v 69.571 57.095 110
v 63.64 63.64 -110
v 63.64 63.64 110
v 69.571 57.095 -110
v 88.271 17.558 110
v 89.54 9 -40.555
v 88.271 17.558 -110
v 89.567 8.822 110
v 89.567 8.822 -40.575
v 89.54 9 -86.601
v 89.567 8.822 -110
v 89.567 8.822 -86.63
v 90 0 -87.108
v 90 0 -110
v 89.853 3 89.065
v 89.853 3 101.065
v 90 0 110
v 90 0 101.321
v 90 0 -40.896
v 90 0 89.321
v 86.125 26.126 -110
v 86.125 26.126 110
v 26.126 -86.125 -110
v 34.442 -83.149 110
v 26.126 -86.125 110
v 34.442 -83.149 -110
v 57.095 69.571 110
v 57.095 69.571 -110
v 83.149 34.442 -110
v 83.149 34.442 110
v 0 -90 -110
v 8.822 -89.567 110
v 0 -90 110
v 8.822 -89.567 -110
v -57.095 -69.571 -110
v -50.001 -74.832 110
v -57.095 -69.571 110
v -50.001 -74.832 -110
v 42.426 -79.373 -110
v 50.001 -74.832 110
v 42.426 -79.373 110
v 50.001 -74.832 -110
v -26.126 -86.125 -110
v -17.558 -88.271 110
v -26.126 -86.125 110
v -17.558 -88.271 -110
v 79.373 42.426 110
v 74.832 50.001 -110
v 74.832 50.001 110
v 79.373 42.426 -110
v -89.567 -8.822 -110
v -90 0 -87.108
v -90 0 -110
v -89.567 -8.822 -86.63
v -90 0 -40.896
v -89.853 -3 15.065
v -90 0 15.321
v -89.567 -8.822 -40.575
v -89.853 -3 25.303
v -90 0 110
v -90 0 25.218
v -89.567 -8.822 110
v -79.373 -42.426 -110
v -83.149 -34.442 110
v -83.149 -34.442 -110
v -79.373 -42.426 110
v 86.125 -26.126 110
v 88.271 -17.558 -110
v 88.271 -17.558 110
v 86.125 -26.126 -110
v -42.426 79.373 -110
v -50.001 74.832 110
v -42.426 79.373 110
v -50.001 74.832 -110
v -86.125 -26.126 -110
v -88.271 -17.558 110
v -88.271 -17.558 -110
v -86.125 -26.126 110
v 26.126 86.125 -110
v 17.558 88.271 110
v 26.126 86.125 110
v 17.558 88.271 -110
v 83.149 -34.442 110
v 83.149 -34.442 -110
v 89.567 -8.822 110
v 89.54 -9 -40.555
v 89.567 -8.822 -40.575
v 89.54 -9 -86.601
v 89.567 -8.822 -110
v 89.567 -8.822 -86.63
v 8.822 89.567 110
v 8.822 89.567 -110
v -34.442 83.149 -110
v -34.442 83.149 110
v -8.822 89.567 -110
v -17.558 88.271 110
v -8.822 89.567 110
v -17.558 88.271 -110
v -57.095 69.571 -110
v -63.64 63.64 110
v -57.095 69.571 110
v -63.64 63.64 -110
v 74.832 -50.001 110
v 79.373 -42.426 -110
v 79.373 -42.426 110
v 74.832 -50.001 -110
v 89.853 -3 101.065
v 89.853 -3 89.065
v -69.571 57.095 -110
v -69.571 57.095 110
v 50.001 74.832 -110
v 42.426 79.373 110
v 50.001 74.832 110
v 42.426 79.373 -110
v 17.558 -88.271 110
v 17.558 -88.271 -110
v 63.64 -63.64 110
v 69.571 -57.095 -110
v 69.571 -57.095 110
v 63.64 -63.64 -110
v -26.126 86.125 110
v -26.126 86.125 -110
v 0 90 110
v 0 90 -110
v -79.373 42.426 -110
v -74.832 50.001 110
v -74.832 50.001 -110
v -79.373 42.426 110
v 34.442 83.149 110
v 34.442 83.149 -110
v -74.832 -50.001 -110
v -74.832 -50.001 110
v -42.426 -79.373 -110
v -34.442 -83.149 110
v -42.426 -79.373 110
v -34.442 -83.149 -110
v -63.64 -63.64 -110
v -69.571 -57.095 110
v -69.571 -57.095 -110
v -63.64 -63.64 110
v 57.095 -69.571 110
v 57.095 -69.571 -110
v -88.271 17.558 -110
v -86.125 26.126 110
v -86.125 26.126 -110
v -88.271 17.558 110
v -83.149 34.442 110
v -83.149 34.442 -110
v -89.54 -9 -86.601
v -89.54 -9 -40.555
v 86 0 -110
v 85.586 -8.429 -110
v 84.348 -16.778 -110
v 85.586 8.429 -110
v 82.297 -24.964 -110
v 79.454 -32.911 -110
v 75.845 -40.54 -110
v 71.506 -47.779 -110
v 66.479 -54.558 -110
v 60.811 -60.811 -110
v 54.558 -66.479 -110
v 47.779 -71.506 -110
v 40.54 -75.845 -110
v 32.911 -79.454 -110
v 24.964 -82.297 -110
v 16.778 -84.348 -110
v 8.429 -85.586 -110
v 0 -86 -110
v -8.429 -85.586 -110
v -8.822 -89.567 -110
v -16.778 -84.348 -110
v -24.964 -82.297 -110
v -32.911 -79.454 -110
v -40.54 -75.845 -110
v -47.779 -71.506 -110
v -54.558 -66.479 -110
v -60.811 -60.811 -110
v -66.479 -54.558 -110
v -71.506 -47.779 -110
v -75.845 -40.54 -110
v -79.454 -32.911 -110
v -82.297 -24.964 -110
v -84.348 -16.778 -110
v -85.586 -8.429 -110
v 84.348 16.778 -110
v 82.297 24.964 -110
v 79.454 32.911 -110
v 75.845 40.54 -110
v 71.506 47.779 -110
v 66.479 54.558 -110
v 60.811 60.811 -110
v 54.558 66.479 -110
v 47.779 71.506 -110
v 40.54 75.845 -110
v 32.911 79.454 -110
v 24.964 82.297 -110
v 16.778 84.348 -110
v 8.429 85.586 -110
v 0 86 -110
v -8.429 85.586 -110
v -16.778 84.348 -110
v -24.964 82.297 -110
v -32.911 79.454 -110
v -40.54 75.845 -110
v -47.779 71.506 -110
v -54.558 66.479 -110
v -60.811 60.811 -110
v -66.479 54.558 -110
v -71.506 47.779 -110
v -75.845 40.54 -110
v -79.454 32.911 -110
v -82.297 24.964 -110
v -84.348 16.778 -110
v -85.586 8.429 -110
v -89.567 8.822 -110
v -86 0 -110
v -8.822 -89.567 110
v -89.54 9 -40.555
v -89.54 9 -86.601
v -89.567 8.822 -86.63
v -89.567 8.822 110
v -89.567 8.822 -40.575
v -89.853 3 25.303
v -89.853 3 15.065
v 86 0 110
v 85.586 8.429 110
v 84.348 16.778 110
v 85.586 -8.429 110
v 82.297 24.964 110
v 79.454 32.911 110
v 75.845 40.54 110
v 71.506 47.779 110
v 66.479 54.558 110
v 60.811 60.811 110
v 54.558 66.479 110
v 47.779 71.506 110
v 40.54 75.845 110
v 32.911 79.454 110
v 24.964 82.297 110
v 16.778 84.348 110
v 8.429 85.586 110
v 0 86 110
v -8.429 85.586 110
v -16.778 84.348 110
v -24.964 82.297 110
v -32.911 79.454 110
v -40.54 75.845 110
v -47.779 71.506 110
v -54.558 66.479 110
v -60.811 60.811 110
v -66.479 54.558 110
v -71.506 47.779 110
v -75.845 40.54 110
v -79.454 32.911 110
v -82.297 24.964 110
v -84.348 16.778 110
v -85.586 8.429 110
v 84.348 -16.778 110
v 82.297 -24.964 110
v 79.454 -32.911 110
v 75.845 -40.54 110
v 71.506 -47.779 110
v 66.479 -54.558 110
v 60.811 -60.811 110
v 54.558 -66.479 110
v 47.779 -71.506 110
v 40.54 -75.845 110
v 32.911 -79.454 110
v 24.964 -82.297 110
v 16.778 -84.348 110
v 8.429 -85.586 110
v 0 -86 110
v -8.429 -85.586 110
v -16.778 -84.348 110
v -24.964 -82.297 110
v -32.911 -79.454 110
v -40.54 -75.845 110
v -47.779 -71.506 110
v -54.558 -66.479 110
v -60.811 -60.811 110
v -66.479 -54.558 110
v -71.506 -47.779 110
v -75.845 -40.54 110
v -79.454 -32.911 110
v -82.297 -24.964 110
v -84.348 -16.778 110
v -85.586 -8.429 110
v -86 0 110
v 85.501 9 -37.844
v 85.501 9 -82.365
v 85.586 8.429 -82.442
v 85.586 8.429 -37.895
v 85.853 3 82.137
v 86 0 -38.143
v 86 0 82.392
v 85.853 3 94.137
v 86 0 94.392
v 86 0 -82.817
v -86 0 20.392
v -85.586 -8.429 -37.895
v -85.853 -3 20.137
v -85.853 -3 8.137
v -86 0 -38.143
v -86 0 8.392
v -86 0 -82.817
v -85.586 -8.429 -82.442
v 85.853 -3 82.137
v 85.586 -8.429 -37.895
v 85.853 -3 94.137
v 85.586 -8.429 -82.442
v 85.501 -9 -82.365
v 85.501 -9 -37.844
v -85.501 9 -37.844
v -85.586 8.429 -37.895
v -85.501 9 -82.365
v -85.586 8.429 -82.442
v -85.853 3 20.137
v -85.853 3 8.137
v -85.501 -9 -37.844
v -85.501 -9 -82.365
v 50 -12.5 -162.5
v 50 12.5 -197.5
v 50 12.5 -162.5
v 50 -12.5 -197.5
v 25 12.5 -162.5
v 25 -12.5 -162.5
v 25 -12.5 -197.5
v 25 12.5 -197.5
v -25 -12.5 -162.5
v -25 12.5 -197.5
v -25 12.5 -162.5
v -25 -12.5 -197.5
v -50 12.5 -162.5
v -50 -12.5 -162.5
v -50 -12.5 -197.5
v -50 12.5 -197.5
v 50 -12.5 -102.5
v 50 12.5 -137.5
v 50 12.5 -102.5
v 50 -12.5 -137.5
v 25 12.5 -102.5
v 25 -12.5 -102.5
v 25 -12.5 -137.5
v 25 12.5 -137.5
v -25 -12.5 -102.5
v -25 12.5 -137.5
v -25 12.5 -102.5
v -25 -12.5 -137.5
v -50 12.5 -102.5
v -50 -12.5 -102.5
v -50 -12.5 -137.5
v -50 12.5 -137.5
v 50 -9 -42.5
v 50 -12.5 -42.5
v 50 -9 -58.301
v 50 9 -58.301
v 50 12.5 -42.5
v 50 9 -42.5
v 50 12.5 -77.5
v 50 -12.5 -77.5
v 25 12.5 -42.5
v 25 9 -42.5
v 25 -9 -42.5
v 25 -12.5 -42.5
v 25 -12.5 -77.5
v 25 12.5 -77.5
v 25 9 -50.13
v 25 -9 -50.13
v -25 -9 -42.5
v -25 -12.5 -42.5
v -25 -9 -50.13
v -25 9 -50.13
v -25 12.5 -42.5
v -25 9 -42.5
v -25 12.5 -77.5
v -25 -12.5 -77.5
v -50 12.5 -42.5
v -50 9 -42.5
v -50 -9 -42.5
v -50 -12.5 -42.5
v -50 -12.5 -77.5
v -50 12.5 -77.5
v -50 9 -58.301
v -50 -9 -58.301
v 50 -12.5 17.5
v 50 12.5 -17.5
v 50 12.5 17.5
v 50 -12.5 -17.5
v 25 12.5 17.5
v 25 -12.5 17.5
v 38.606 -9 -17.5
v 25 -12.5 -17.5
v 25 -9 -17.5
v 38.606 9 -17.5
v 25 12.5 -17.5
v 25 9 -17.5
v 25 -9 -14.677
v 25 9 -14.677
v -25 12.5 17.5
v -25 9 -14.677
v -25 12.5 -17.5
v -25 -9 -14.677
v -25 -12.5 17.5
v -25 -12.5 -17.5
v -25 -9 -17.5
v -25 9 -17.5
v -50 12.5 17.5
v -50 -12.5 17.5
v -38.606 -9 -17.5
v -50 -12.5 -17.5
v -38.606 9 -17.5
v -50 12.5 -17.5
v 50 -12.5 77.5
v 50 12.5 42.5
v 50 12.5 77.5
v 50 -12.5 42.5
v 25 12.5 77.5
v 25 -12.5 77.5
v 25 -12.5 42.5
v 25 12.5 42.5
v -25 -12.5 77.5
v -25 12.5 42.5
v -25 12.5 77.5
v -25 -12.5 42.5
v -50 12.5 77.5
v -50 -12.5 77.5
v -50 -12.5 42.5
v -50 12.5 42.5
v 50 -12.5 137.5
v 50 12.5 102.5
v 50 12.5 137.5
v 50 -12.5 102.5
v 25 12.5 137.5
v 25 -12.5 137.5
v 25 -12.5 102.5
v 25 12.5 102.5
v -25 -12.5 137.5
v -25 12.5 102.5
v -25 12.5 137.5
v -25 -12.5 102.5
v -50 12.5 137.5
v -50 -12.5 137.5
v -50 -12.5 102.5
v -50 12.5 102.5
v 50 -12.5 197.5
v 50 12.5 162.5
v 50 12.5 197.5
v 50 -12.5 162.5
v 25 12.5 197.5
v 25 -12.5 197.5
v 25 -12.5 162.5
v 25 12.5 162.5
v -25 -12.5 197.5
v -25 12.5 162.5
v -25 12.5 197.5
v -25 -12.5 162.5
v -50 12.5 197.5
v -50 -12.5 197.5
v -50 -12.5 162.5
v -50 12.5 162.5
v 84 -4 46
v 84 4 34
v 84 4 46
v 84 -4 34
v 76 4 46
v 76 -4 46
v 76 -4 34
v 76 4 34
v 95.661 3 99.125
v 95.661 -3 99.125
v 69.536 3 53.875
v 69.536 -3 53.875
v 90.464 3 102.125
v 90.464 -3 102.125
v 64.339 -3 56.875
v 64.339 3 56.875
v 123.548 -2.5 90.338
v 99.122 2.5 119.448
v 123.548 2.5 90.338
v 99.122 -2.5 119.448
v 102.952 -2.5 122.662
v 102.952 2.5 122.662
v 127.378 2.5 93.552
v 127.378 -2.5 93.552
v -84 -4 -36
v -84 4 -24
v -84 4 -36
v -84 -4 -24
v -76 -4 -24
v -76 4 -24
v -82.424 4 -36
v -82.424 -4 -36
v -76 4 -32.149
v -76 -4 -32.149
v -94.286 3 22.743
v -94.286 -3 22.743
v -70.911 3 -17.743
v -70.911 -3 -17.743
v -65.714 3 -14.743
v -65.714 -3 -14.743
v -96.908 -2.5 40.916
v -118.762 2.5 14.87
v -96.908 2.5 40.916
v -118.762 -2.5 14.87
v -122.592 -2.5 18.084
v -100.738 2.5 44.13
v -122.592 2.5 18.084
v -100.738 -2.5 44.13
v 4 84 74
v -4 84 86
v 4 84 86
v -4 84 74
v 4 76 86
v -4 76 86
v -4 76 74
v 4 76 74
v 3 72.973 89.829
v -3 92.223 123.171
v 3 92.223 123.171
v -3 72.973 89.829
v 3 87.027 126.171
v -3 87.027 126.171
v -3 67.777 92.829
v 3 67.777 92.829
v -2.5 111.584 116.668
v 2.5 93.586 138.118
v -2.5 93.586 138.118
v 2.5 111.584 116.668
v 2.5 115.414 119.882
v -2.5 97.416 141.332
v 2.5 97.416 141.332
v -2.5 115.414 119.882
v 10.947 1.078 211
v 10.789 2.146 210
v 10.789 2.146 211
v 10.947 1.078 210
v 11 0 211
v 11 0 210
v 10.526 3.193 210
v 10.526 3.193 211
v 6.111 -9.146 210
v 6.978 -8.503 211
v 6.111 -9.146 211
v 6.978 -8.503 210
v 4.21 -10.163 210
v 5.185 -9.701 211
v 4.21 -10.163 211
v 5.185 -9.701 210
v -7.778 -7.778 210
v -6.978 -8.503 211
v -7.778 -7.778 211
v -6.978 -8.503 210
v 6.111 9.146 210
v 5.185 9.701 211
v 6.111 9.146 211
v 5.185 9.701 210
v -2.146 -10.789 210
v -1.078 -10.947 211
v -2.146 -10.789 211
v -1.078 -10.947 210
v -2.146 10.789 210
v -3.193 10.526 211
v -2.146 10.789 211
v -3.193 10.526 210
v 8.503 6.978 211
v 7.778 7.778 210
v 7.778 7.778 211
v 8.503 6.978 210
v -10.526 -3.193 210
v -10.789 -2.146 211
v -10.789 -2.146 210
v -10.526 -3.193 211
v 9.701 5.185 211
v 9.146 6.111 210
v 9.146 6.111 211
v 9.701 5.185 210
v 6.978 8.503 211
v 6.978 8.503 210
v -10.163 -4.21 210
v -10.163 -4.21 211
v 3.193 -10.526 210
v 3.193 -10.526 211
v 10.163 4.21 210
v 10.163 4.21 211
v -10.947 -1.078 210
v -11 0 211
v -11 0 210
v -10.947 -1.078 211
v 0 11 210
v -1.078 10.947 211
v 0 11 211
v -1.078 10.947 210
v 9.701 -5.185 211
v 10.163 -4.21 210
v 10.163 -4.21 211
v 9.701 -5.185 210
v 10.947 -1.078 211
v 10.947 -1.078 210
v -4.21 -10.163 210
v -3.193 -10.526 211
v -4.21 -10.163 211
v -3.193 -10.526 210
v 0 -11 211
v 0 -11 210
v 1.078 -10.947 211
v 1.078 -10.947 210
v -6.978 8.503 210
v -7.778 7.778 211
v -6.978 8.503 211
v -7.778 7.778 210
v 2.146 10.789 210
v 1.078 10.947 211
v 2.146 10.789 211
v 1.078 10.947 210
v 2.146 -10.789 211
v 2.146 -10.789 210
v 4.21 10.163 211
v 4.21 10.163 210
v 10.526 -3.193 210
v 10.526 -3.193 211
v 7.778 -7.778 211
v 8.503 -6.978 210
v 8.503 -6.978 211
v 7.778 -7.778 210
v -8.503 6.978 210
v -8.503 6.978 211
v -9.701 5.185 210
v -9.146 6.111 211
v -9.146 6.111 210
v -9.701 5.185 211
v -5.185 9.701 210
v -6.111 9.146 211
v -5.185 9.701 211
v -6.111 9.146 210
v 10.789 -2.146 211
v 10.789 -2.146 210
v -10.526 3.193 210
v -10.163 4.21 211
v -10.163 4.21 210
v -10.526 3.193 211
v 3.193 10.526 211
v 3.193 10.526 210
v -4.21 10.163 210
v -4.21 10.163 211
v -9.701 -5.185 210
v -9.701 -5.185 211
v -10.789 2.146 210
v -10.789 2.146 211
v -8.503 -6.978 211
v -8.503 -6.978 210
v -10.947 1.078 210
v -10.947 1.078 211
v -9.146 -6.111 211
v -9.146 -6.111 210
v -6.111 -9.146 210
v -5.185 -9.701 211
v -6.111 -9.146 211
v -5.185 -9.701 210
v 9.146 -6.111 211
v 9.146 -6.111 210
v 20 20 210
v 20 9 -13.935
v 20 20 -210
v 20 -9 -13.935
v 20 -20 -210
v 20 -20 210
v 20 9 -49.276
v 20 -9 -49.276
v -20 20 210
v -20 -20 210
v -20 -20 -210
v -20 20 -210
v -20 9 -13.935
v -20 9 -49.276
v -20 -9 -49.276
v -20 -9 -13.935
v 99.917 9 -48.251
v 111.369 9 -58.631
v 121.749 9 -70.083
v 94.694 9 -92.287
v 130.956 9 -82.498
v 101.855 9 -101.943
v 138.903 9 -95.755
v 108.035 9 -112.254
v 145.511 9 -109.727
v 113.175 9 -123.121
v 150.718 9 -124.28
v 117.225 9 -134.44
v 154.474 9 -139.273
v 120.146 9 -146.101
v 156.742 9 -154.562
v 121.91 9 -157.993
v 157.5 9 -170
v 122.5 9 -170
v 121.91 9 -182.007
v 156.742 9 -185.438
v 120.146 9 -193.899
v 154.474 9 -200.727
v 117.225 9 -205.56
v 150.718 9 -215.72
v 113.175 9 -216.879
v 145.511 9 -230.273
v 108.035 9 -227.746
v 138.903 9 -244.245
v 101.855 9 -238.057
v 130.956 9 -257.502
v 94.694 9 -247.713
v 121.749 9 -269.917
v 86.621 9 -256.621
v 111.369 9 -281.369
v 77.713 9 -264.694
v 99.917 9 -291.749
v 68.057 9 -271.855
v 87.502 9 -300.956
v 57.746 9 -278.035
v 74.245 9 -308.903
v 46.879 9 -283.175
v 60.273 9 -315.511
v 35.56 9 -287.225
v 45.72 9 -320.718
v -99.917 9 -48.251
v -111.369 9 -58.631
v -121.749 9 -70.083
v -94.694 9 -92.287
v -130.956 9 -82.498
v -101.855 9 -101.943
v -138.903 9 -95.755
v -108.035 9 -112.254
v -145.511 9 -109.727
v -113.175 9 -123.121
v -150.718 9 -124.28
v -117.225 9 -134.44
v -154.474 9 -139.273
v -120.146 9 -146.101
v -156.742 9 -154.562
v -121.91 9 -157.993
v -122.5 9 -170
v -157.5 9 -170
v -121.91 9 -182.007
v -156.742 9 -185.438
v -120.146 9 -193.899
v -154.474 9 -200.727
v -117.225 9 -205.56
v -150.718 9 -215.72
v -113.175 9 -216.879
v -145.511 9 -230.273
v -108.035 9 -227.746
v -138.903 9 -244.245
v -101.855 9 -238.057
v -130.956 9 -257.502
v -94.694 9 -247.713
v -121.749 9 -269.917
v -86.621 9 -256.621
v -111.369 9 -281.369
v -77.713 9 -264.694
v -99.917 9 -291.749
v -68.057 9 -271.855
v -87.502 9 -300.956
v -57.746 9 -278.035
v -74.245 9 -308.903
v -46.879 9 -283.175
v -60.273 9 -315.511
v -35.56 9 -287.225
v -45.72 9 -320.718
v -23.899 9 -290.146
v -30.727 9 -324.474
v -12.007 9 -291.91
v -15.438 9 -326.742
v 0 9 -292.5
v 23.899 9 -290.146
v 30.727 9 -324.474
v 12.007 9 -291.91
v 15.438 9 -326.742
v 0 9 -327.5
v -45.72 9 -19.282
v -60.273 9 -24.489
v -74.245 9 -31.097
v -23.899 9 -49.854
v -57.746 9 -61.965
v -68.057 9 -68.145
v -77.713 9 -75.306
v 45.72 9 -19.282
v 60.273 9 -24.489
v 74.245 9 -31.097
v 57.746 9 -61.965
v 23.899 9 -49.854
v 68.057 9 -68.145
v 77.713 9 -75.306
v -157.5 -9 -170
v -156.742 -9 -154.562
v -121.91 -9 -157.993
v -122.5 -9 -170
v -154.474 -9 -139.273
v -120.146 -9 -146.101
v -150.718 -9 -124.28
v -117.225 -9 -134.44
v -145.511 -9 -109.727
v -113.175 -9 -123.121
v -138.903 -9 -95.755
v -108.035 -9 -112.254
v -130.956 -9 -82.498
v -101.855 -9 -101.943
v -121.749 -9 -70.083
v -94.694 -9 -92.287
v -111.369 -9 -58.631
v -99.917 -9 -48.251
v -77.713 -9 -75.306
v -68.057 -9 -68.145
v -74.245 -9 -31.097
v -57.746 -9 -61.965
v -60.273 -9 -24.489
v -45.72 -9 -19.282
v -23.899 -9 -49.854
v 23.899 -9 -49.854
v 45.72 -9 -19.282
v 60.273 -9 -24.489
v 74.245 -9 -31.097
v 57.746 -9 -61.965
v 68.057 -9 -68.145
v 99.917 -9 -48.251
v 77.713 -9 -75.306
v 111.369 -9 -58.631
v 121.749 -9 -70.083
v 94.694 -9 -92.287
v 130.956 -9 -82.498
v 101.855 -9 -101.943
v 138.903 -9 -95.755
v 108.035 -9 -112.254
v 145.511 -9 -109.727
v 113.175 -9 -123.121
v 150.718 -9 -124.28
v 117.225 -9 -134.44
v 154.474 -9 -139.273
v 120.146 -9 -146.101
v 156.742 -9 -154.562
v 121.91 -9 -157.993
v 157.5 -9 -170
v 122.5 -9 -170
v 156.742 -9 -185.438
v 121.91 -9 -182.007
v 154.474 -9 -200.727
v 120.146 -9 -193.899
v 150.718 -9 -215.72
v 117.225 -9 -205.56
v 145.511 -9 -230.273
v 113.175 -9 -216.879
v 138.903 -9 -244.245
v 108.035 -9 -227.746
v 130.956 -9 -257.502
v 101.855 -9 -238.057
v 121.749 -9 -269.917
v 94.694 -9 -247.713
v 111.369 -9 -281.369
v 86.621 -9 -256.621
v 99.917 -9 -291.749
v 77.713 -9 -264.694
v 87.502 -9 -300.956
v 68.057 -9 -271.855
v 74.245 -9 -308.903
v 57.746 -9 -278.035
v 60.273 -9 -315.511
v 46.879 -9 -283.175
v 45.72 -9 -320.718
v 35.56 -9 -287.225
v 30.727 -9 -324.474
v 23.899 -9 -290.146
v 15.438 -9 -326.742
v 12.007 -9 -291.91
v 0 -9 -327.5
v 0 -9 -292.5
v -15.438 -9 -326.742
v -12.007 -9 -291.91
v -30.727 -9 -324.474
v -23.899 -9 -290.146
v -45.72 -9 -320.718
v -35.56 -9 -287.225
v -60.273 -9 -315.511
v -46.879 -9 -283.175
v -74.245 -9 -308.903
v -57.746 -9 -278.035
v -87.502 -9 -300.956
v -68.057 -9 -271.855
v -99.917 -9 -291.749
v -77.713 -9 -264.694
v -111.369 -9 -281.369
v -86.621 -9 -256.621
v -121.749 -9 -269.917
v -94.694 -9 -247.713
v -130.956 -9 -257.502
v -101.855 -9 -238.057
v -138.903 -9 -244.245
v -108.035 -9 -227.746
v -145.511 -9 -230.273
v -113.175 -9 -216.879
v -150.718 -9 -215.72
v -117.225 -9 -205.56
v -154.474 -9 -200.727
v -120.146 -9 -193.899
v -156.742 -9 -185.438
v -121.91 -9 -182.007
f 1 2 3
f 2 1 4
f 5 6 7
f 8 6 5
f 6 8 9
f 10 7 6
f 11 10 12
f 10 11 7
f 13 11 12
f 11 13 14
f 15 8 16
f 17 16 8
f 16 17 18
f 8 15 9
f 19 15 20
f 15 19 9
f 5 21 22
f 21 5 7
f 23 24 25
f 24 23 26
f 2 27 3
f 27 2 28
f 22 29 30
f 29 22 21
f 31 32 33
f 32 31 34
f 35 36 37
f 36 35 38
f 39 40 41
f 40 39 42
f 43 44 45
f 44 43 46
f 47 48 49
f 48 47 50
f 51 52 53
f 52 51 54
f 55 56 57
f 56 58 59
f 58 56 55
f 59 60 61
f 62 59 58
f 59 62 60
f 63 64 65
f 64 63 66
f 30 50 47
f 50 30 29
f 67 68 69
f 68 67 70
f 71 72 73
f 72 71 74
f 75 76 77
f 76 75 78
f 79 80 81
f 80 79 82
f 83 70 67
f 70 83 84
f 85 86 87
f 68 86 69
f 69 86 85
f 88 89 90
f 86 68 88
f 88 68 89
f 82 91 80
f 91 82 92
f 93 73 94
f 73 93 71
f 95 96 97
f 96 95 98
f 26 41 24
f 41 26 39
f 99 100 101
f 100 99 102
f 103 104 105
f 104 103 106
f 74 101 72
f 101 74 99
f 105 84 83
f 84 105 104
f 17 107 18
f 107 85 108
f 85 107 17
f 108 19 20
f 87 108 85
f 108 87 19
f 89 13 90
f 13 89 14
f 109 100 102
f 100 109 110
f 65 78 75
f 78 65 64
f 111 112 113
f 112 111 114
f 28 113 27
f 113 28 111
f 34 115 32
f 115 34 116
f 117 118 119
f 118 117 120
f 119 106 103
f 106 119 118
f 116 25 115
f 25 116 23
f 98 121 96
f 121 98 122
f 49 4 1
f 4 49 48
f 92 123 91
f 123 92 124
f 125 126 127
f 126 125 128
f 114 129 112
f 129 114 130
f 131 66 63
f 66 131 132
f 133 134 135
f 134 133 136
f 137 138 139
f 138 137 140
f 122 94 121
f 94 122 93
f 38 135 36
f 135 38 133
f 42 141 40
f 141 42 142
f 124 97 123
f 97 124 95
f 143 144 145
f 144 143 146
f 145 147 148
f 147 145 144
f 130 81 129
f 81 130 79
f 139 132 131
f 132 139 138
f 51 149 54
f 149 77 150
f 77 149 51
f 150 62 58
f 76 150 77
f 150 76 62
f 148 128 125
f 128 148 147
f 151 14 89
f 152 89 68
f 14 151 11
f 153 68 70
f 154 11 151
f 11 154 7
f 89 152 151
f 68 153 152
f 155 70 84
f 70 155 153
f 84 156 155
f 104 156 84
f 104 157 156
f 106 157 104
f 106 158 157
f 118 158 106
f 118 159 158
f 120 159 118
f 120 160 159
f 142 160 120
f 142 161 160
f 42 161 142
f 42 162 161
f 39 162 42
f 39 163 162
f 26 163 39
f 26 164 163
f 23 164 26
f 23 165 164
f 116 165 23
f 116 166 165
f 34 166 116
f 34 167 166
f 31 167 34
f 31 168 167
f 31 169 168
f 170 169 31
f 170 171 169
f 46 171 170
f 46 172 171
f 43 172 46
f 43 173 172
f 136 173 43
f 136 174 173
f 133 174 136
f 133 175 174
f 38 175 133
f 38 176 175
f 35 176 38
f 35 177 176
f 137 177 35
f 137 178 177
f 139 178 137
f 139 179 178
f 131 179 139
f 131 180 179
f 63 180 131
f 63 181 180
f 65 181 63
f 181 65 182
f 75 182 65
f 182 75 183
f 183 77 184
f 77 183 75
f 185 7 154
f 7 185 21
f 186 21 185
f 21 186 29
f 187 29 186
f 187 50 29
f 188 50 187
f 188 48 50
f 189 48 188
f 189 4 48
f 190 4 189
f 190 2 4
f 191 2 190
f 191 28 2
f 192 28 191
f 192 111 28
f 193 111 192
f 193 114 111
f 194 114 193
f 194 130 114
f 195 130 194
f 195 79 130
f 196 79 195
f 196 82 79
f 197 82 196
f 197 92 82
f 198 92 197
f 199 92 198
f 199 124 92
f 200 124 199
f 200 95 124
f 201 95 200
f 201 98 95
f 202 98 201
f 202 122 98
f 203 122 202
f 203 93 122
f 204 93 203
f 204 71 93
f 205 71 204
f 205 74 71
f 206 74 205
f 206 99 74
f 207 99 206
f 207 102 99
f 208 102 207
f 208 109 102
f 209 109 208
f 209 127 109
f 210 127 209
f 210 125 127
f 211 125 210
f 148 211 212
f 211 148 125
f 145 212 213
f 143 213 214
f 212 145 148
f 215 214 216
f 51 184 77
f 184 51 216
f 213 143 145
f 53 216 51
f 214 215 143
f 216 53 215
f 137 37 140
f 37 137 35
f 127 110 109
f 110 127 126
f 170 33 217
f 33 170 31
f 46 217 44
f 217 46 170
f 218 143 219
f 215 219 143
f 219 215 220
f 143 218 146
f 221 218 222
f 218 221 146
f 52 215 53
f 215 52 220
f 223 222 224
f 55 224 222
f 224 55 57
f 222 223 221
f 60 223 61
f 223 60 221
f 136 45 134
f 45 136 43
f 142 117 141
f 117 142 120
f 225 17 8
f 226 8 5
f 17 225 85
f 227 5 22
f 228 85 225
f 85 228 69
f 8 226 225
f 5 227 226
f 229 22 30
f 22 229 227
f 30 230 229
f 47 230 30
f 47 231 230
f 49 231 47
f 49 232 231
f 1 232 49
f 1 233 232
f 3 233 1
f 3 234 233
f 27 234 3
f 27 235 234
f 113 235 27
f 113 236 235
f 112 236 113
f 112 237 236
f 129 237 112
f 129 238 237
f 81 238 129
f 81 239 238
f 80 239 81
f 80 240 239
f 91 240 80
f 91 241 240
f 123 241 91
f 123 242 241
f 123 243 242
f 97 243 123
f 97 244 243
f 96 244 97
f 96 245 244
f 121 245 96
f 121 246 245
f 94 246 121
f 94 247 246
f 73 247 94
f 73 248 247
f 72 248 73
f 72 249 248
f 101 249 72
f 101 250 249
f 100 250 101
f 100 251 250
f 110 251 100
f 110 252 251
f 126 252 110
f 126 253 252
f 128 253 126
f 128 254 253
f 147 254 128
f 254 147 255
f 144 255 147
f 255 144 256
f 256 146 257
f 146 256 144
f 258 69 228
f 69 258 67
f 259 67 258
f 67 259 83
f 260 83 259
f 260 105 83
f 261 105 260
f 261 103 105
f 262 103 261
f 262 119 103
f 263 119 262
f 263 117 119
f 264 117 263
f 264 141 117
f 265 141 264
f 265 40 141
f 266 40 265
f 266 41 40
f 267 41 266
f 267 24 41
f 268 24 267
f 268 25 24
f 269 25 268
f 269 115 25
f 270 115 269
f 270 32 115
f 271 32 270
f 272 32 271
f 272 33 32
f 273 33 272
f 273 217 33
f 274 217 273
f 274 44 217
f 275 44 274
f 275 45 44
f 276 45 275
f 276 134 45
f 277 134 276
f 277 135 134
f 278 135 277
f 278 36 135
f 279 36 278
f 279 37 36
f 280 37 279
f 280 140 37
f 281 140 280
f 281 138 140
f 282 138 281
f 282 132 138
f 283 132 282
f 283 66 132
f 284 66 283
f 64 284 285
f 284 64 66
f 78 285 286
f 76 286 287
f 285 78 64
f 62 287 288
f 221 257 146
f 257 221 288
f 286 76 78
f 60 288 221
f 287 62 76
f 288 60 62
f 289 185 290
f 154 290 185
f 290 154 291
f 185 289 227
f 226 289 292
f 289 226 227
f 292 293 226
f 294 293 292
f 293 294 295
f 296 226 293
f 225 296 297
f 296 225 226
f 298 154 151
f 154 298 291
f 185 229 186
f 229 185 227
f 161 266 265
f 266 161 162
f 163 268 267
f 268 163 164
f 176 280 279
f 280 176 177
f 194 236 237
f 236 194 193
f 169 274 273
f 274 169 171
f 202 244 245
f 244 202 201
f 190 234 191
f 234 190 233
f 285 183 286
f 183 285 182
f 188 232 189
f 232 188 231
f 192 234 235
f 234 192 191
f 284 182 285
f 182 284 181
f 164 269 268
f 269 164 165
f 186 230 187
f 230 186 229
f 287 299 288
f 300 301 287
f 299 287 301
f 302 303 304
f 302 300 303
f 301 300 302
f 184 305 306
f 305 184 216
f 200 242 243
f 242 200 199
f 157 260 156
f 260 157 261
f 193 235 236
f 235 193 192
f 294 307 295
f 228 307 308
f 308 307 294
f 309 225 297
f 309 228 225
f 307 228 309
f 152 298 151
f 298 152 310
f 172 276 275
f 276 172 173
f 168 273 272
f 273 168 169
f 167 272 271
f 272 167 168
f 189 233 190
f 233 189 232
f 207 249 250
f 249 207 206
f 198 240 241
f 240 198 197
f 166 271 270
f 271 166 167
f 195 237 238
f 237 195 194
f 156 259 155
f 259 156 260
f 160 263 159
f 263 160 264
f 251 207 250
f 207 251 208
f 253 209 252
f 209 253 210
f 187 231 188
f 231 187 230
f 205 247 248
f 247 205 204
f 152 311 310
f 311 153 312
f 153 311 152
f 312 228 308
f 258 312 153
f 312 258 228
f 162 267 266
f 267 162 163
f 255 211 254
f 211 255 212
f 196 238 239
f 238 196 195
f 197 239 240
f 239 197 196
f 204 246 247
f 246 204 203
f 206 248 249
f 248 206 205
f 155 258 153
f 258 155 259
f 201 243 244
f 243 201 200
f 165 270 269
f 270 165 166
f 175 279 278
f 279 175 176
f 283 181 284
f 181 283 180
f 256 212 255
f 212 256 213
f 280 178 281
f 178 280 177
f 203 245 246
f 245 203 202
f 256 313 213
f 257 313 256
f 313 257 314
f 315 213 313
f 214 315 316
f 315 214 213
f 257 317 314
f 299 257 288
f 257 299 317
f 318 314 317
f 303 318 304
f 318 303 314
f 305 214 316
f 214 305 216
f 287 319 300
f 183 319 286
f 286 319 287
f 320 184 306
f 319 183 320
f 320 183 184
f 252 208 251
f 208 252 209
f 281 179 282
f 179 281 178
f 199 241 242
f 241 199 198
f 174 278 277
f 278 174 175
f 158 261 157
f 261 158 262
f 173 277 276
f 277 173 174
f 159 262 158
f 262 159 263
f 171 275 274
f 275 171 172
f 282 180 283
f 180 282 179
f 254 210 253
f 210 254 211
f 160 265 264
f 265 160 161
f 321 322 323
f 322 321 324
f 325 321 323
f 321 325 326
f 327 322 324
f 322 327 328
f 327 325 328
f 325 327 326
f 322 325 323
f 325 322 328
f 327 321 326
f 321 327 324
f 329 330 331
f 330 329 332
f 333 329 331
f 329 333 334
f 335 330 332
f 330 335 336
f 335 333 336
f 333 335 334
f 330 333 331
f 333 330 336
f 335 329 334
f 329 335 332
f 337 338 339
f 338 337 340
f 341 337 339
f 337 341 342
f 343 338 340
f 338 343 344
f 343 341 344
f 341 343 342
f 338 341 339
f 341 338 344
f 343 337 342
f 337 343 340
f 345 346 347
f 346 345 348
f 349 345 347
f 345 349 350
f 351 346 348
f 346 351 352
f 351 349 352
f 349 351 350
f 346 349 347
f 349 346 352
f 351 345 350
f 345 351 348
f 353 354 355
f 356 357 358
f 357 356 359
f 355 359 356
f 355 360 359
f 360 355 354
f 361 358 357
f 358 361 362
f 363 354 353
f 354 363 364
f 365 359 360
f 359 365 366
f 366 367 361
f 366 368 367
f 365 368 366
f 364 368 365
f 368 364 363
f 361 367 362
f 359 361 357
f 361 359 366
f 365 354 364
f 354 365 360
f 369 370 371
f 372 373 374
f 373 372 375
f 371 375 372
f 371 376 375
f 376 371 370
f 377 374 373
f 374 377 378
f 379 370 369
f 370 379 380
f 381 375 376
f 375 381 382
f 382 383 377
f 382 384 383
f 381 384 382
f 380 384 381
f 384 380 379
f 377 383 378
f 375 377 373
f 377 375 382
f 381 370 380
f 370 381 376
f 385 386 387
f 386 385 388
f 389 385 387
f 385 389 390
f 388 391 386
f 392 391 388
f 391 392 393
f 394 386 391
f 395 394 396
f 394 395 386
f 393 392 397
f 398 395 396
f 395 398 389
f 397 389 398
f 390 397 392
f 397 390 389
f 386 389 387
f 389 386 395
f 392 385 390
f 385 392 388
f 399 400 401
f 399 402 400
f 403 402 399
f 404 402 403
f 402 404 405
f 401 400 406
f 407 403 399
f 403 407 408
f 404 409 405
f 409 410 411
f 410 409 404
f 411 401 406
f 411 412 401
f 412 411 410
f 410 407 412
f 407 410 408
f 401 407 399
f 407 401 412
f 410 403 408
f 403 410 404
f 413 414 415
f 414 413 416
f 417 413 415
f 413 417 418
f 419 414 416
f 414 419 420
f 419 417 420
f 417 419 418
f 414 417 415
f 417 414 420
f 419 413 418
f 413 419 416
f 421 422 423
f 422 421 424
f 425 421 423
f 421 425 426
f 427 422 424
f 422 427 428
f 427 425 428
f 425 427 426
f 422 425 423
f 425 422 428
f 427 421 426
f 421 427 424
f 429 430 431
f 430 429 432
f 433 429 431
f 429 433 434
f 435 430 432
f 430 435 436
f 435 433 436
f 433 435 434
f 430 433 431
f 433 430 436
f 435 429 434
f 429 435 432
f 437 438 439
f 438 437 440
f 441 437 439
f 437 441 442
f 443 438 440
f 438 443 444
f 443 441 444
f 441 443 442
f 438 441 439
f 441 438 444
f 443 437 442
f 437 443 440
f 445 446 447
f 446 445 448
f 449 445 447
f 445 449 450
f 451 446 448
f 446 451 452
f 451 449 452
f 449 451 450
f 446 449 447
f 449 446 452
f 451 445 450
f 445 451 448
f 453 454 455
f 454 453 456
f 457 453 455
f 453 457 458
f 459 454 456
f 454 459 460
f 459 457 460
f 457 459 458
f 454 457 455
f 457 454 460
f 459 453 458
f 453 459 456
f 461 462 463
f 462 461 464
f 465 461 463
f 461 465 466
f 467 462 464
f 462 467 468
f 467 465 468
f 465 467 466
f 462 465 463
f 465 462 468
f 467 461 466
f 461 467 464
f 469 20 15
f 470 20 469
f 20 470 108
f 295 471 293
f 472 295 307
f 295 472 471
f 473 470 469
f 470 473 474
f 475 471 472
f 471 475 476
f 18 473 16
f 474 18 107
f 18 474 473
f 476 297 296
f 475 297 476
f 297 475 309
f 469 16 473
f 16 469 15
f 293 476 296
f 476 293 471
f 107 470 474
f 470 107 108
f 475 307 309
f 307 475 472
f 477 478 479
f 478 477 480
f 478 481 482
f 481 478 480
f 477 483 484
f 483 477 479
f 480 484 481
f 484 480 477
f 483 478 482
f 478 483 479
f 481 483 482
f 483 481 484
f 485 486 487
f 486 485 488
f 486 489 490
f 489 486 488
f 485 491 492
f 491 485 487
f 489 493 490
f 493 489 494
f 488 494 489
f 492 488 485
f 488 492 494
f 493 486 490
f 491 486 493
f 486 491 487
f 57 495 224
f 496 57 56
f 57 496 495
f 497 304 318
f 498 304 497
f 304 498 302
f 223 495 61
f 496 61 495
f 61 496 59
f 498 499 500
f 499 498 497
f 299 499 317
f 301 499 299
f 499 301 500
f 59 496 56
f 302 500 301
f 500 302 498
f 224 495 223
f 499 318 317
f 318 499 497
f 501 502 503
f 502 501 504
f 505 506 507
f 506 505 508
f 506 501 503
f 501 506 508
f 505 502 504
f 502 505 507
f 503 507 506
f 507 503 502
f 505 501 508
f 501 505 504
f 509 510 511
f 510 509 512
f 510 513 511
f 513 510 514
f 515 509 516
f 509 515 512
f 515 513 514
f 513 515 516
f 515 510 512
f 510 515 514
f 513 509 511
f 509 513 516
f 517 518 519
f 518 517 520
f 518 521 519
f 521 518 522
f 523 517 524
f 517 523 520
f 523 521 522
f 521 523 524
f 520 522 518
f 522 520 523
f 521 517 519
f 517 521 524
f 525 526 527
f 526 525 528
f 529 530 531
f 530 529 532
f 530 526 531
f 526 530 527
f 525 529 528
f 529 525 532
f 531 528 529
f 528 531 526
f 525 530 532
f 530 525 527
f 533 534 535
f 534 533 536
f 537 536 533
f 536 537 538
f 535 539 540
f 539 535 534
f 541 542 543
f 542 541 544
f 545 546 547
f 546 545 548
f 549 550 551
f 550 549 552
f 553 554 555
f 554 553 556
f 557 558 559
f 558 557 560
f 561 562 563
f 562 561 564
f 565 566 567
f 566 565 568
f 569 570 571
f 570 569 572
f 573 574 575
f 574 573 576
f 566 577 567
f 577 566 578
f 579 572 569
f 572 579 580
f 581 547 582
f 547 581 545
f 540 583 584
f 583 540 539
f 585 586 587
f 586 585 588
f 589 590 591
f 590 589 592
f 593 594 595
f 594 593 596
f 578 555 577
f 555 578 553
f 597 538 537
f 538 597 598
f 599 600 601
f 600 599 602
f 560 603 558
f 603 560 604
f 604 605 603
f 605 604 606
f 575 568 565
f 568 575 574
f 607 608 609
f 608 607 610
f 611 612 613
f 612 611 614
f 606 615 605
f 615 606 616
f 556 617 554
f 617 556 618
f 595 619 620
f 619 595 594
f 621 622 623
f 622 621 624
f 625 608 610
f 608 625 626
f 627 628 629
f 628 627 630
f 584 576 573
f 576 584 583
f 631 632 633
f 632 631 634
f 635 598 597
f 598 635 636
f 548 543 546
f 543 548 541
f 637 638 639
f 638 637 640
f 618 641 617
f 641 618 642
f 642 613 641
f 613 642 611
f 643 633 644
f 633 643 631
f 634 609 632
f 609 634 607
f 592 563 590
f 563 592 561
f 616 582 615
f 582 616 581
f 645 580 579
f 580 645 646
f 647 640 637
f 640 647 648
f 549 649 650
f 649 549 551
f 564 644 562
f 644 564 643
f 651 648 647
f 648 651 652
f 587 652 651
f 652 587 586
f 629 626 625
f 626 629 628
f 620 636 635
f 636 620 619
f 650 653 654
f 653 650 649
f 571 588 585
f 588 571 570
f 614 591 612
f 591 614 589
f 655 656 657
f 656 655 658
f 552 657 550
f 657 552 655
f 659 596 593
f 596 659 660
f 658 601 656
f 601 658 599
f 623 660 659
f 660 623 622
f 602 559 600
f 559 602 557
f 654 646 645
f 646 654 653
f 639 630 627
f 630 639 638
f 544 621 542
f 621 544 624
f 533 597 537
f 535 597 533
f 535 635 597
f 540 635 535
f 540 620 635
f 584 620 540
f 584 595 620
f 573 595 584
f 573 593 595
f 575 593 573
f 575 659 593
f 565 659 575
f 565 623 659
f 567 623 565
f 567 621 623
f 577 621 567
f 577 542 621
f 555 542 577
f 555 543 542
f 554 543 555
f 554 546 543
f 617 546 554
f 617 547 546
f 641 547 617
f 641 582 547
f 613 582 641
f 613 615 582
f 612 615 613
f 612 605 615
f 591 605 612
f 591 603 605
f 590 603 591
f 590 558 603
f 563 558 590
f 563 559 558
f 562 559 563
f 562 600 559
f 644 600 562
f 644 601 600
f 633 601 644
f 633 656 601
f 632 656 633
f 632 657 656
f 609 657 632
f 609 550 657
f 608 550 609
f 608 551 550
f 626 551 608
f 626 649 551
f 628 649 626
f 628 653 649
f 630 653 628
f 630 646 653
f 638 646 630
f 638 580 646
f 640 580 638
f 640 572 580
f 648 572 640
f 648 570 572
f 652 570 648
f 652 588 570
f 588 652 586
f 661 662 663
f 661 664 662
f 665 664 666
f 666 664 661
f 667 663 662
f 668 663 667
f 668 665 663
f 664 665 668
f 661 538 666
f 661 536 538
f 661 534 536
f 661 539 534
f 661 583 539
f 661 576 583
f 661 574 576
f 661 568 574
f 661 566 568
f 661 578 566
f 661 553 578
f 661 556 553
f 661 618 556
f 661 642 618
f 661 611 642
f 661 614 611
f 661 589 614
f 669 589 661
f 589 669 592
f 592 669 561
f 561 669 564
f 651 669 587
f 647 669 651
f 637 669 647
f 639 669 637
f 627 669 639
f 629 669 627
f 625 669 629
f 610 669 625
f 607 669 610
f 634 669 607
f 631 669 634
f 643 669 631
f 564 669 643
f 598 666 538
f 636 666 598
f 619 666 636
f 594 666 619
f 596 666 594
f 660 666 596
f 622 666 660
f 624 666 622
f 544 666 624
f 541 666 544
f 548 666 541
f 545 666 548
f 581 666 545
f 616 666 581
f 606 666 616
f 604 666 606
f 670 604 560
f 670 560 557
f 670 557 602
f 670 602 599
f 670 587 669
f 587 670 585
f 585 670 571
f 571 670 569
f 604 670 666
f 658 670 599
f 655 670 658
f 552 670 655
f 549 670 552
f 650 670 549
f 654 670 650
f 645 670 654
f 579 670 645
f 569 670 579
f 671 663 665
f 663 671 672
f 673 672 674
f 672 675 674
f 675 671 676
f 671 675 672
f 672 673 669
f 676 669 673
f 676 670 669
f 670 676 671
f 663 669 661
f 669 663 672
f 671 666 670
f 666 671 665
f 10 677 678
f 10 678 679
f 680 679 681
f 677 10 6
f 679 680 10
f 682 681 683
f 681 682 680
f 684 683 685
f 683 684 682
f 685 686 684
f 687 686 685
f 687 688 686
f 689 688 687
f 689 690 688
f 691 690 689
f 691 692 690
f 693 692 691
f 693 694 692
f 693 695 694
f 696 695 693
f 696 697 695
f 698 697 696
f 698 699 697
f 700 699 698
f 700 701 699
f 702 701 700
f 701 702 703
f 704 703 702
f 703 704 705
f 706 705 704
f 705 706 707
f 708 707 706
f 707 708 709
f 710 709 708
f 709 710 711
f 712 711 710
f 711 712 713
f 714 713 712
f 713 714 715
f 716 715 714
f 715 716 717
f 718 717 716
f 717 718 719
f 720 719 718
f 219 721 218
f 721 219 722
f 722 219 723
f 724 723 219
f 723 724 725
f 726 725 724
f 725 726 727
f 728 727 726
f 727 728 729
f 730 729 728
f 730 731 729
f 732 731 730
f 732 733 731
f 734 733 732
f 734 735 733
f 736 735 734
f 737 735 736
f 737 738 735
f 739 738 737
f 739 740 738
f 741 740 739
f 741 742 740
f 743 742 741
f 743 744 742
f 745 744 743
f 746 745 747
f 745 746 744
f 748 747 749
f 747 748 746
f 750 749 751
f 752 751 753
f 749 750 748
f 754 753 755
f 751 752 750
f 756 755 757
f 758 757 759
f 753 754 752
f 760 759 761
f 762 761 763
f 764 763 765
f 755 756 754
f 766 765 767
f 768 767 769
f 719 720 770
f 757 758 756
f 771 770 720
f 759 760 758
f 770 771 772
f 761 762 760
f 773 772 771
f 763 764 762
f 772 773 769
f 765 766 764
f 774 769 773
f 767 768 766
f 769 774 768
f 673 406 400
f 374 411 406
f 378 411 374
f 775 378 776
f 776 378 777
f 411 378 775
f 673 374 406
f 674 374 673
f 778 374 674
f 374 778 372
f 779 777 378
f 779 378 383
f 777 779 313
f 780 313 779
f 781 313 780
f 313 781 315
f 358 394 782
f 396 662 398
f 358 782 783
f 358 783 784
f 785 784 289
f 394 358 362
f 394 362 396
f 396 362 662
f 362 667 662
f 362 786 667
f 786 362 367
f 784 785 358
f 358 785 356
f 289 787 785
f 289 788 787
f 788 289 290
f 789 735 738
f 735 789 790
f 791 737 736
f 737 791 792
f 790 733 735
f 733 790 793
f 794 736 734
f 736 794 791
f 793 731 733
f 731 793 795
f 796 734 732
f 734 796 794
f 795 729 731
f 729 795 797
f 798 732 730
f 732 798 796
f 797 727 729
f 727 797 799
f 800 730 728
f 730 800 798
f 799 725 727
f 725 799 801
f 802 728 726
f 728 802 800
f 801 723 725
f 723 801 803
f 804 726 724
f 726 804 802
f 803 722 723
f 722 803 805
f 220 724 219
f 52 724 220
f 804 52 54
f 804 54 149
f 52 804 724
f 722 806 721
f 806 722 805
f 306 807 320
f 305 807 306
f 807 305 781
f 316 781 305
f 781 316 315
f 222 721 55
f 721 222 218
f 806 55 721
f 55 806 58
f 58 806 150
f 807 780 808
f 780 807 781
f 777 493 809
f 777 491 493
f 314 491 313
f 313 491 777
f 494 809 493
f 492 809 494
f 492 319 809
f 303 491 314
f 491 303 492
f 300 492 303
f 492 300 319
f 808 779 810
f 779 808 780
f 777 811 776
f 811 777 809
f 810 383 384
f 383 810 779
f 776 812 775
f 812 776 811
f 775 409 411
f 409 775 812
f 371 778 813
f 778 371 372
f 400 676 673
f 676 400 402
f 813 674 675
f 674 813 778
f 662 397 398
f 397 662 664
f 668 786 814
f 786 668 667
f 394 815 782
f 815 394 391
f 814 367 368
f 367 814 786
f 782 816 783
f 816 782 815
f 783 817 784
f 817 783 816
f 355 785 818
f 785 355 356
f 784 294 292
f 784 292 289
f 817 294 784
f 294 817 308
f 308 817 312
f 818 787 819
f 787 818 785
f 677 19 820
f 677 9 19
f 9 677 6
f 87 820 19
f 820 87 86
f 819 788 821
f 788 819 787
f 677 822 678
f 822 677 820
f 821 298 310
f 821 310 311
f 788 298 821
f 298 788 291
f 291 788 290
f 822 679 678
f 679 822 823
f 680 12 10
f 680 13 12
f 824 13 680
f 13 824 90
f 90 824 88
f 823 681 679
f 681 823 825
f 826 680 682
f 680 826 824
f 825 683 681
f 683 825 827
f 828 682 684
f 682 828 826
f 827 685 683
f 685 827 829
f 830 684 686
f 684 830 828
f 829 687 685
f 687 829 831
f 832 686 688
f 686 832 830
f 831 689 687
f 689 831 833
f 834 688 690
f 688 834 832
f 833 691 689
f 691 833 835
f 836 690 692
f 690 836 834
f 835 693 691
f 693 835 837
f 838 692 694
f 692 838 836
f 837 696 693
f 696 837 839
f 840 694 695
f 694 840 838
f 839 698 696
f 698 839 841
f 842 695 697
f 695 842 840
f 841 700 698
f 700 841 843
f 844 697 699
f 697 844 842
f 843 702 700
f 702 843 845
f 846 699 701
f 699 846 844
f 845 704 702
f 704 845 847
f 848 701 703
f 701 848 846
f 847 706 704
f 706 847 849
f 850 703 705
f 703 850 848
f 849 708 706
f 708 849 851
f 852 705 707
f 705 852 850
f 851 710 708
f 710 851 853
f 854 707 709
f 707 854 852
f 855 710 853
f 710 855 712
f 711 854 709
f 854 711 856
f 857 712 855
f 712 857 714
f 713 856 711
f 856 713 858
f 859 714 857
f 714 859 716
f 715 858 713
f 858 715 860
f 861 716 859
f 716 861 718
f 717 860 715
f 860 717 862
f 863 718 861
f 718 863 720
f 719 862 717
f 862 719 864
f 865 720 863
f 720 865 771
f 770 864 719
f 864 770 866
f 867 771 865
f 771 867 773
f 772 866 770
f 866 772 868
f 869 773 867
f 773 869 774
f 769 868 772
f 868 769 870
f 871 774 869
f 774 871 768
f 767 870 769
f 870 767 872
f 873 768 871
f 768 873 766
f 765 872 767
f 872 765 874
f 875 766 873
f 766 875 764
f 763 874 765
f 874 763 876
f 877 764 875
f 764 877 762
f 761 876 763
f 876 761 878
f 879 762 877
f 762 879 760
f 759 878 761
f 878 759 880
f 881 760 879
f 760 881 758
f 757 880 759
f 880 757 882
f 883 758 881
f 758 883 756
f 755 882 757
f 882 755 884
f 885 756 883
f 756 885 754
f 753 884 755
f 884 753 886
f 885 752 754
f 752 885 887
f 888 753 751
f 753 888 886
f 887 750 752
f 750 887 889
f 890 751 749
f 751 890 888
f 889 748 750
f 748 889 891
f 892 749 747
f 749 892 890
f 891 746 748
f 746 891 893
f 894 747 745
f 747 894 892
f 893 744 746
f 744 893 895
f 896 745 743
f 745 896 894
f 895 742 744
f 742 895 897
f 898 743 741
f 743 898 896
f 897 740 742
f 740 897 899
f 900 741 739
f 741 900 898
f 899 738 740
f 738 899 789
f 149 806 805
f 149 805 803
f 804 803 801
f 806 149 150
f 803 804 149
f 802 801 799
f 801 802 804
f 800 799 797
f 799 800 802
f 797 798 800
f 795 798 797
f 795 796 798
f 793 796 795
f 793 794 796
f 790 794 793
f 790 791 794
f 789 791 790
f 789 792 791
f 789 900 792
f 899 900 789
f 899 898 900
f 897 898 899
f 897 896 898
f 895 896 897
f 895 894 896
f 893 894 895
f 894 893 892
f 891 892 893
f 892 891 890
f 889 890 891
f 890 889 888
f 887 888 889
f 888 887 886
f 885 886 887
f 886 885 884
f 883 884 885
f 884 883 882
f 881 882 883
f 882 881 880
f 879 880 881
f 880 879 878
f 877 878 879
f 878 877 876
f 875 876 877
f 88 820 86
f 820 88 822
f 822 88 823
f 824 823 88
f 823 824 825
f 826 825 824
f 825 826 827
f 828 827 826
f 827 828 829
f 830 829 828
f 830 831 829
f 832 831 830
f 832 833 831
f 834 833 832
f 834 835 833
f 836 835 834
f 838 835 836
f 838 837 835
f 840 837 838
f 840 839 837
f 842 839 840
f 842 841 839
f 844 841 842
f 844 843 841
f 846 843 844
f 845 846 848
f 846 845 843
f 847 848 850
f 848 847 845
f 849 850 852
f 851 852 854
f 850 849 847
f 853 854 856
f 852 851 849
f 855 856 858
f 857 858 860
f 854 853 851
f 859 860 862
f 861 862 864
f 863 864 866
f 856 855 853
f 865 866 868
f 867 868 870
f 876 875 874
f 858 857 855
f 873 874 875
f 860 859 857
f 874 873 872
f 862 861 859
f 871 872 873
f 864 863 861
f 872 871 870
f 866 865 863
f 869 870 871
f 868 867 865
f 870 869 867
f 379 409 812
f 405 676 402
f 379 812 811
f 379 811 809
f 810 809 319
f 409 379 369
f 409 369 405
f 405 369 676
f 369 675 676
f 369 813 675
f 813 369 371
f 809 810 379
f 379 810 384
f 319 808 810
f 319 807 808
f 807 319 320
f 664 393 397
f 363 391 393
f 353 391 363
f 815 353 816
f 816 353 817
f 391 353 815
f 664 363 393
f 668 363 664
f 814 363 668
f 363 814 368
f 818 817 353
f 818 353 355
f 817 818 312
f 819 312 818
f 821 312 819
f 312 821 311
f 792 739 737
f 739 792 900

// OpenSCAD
// ============================================================
// Modular Orbital Shipyard - Parametric Concept
// Scale: meters
// ============================================================

$fn = 64; // smoothness

// -------------------- Parameters (easy to tweak) --------------------
assembly_dia = 180; // diameter of central zero-g bay
assembly_length = 220; // length of open assembly volume
truss_size = 40; // square truss cross-section
truss_length = 420; // overall spine length
ring_dia = 280; // habitat/control ring diameter
ring_width = 35; // width of the rotating ring
ring_height = 18; // height of ring modules
module_size = 25; // size of service modules

// -------------------- Modules --------------------

// Central open assembly cylinder (thin wall representation)
module assembly_bay() {
 difference() {
 cylinder(h = assembly_length, d = assembly_dia, center = true);
 cylinder(h = assembly_length + 2, d = assembly_dia - 8, center = true);
 }
}

// Main structural truss spine
module main_truss() {
 color("LightGray")
 cube([truss_size, truss_size, truss_length], center = true);
}

// Habitat / control ring (simplified as a toroidal structure)
module habitat_ring() {
 rotate([90, 0, 0])
 rotate_extrude(angle = 360)
 translate([ring_dia/2, 0, 0])
 square([ring_width, ring_height], center = true);
}

// Service / docking module
module service_module() {
 cube([module_size, module_size, module_size*1.4], center = true);
}

// Simplified large robotic arm
module robotic_arm(length = 90) {
 // Base
 cube([8, 8, 12], center = true);
 // Upper arm
 translate([0, 0, length*0.4])
 rotate([0, 30, 0])
 cube([6, 6, length*0.55], center = true);
 // Forearm
 translate([length*0.35, 0, length*0.7])
 rotate([0, -40, 0])
 cube([5, 5, length*0.4], center = true);
}

// -------------------- Assembly --------------------

// Central zero-g assembly bay
color("SteelBlue")
translate([0, 0, 0])
assembly_bay();

// Main truss spine running through
main_truss();

// Habitat ring offset to one side of the assembly bay
color("DarkOliveGreen")
translate([0, 0, -assembly_length/2 - 60])
habitat_ring();

// Service modules along the truss
for (z = [-180 : 60 : 180]) {
 translate([truss_size/2 + module_size/2 + 5, 0, z])
 color("DimGray")
 service_module();
 
 translate([-(truss_size/2 + module_size/2 + 5), 0, z])
 color("DimGray")
 service_module();
}

// A few large robotic arms
translate([assembly_dia/2 - 10, 0, 40])
color("Orange")
robotic_arm(95);

translate([-assembly_dia/2 + 10, 0, -30])
rotate([0, 0, 180])
color("Orange")
robotic_arm(85);

translate([0, assembly_dia/2 - 10, 80])
rotate([0, 0, 90])
color("Orange")
robotic_arm(70);

// Simple end docking ports
module docking_port() {
 cylinder(h = 12, d = 28, center = true);
 translate([0, 0, 8])
 cylinder(h = 6, d = 22, center = true);
}

translate([0, 0, truss_length/2 - 10])
color("Silver")
docking_port();

translate([0, 0, -truss_length/2 + 10])
color("Silver")
docking_port();
